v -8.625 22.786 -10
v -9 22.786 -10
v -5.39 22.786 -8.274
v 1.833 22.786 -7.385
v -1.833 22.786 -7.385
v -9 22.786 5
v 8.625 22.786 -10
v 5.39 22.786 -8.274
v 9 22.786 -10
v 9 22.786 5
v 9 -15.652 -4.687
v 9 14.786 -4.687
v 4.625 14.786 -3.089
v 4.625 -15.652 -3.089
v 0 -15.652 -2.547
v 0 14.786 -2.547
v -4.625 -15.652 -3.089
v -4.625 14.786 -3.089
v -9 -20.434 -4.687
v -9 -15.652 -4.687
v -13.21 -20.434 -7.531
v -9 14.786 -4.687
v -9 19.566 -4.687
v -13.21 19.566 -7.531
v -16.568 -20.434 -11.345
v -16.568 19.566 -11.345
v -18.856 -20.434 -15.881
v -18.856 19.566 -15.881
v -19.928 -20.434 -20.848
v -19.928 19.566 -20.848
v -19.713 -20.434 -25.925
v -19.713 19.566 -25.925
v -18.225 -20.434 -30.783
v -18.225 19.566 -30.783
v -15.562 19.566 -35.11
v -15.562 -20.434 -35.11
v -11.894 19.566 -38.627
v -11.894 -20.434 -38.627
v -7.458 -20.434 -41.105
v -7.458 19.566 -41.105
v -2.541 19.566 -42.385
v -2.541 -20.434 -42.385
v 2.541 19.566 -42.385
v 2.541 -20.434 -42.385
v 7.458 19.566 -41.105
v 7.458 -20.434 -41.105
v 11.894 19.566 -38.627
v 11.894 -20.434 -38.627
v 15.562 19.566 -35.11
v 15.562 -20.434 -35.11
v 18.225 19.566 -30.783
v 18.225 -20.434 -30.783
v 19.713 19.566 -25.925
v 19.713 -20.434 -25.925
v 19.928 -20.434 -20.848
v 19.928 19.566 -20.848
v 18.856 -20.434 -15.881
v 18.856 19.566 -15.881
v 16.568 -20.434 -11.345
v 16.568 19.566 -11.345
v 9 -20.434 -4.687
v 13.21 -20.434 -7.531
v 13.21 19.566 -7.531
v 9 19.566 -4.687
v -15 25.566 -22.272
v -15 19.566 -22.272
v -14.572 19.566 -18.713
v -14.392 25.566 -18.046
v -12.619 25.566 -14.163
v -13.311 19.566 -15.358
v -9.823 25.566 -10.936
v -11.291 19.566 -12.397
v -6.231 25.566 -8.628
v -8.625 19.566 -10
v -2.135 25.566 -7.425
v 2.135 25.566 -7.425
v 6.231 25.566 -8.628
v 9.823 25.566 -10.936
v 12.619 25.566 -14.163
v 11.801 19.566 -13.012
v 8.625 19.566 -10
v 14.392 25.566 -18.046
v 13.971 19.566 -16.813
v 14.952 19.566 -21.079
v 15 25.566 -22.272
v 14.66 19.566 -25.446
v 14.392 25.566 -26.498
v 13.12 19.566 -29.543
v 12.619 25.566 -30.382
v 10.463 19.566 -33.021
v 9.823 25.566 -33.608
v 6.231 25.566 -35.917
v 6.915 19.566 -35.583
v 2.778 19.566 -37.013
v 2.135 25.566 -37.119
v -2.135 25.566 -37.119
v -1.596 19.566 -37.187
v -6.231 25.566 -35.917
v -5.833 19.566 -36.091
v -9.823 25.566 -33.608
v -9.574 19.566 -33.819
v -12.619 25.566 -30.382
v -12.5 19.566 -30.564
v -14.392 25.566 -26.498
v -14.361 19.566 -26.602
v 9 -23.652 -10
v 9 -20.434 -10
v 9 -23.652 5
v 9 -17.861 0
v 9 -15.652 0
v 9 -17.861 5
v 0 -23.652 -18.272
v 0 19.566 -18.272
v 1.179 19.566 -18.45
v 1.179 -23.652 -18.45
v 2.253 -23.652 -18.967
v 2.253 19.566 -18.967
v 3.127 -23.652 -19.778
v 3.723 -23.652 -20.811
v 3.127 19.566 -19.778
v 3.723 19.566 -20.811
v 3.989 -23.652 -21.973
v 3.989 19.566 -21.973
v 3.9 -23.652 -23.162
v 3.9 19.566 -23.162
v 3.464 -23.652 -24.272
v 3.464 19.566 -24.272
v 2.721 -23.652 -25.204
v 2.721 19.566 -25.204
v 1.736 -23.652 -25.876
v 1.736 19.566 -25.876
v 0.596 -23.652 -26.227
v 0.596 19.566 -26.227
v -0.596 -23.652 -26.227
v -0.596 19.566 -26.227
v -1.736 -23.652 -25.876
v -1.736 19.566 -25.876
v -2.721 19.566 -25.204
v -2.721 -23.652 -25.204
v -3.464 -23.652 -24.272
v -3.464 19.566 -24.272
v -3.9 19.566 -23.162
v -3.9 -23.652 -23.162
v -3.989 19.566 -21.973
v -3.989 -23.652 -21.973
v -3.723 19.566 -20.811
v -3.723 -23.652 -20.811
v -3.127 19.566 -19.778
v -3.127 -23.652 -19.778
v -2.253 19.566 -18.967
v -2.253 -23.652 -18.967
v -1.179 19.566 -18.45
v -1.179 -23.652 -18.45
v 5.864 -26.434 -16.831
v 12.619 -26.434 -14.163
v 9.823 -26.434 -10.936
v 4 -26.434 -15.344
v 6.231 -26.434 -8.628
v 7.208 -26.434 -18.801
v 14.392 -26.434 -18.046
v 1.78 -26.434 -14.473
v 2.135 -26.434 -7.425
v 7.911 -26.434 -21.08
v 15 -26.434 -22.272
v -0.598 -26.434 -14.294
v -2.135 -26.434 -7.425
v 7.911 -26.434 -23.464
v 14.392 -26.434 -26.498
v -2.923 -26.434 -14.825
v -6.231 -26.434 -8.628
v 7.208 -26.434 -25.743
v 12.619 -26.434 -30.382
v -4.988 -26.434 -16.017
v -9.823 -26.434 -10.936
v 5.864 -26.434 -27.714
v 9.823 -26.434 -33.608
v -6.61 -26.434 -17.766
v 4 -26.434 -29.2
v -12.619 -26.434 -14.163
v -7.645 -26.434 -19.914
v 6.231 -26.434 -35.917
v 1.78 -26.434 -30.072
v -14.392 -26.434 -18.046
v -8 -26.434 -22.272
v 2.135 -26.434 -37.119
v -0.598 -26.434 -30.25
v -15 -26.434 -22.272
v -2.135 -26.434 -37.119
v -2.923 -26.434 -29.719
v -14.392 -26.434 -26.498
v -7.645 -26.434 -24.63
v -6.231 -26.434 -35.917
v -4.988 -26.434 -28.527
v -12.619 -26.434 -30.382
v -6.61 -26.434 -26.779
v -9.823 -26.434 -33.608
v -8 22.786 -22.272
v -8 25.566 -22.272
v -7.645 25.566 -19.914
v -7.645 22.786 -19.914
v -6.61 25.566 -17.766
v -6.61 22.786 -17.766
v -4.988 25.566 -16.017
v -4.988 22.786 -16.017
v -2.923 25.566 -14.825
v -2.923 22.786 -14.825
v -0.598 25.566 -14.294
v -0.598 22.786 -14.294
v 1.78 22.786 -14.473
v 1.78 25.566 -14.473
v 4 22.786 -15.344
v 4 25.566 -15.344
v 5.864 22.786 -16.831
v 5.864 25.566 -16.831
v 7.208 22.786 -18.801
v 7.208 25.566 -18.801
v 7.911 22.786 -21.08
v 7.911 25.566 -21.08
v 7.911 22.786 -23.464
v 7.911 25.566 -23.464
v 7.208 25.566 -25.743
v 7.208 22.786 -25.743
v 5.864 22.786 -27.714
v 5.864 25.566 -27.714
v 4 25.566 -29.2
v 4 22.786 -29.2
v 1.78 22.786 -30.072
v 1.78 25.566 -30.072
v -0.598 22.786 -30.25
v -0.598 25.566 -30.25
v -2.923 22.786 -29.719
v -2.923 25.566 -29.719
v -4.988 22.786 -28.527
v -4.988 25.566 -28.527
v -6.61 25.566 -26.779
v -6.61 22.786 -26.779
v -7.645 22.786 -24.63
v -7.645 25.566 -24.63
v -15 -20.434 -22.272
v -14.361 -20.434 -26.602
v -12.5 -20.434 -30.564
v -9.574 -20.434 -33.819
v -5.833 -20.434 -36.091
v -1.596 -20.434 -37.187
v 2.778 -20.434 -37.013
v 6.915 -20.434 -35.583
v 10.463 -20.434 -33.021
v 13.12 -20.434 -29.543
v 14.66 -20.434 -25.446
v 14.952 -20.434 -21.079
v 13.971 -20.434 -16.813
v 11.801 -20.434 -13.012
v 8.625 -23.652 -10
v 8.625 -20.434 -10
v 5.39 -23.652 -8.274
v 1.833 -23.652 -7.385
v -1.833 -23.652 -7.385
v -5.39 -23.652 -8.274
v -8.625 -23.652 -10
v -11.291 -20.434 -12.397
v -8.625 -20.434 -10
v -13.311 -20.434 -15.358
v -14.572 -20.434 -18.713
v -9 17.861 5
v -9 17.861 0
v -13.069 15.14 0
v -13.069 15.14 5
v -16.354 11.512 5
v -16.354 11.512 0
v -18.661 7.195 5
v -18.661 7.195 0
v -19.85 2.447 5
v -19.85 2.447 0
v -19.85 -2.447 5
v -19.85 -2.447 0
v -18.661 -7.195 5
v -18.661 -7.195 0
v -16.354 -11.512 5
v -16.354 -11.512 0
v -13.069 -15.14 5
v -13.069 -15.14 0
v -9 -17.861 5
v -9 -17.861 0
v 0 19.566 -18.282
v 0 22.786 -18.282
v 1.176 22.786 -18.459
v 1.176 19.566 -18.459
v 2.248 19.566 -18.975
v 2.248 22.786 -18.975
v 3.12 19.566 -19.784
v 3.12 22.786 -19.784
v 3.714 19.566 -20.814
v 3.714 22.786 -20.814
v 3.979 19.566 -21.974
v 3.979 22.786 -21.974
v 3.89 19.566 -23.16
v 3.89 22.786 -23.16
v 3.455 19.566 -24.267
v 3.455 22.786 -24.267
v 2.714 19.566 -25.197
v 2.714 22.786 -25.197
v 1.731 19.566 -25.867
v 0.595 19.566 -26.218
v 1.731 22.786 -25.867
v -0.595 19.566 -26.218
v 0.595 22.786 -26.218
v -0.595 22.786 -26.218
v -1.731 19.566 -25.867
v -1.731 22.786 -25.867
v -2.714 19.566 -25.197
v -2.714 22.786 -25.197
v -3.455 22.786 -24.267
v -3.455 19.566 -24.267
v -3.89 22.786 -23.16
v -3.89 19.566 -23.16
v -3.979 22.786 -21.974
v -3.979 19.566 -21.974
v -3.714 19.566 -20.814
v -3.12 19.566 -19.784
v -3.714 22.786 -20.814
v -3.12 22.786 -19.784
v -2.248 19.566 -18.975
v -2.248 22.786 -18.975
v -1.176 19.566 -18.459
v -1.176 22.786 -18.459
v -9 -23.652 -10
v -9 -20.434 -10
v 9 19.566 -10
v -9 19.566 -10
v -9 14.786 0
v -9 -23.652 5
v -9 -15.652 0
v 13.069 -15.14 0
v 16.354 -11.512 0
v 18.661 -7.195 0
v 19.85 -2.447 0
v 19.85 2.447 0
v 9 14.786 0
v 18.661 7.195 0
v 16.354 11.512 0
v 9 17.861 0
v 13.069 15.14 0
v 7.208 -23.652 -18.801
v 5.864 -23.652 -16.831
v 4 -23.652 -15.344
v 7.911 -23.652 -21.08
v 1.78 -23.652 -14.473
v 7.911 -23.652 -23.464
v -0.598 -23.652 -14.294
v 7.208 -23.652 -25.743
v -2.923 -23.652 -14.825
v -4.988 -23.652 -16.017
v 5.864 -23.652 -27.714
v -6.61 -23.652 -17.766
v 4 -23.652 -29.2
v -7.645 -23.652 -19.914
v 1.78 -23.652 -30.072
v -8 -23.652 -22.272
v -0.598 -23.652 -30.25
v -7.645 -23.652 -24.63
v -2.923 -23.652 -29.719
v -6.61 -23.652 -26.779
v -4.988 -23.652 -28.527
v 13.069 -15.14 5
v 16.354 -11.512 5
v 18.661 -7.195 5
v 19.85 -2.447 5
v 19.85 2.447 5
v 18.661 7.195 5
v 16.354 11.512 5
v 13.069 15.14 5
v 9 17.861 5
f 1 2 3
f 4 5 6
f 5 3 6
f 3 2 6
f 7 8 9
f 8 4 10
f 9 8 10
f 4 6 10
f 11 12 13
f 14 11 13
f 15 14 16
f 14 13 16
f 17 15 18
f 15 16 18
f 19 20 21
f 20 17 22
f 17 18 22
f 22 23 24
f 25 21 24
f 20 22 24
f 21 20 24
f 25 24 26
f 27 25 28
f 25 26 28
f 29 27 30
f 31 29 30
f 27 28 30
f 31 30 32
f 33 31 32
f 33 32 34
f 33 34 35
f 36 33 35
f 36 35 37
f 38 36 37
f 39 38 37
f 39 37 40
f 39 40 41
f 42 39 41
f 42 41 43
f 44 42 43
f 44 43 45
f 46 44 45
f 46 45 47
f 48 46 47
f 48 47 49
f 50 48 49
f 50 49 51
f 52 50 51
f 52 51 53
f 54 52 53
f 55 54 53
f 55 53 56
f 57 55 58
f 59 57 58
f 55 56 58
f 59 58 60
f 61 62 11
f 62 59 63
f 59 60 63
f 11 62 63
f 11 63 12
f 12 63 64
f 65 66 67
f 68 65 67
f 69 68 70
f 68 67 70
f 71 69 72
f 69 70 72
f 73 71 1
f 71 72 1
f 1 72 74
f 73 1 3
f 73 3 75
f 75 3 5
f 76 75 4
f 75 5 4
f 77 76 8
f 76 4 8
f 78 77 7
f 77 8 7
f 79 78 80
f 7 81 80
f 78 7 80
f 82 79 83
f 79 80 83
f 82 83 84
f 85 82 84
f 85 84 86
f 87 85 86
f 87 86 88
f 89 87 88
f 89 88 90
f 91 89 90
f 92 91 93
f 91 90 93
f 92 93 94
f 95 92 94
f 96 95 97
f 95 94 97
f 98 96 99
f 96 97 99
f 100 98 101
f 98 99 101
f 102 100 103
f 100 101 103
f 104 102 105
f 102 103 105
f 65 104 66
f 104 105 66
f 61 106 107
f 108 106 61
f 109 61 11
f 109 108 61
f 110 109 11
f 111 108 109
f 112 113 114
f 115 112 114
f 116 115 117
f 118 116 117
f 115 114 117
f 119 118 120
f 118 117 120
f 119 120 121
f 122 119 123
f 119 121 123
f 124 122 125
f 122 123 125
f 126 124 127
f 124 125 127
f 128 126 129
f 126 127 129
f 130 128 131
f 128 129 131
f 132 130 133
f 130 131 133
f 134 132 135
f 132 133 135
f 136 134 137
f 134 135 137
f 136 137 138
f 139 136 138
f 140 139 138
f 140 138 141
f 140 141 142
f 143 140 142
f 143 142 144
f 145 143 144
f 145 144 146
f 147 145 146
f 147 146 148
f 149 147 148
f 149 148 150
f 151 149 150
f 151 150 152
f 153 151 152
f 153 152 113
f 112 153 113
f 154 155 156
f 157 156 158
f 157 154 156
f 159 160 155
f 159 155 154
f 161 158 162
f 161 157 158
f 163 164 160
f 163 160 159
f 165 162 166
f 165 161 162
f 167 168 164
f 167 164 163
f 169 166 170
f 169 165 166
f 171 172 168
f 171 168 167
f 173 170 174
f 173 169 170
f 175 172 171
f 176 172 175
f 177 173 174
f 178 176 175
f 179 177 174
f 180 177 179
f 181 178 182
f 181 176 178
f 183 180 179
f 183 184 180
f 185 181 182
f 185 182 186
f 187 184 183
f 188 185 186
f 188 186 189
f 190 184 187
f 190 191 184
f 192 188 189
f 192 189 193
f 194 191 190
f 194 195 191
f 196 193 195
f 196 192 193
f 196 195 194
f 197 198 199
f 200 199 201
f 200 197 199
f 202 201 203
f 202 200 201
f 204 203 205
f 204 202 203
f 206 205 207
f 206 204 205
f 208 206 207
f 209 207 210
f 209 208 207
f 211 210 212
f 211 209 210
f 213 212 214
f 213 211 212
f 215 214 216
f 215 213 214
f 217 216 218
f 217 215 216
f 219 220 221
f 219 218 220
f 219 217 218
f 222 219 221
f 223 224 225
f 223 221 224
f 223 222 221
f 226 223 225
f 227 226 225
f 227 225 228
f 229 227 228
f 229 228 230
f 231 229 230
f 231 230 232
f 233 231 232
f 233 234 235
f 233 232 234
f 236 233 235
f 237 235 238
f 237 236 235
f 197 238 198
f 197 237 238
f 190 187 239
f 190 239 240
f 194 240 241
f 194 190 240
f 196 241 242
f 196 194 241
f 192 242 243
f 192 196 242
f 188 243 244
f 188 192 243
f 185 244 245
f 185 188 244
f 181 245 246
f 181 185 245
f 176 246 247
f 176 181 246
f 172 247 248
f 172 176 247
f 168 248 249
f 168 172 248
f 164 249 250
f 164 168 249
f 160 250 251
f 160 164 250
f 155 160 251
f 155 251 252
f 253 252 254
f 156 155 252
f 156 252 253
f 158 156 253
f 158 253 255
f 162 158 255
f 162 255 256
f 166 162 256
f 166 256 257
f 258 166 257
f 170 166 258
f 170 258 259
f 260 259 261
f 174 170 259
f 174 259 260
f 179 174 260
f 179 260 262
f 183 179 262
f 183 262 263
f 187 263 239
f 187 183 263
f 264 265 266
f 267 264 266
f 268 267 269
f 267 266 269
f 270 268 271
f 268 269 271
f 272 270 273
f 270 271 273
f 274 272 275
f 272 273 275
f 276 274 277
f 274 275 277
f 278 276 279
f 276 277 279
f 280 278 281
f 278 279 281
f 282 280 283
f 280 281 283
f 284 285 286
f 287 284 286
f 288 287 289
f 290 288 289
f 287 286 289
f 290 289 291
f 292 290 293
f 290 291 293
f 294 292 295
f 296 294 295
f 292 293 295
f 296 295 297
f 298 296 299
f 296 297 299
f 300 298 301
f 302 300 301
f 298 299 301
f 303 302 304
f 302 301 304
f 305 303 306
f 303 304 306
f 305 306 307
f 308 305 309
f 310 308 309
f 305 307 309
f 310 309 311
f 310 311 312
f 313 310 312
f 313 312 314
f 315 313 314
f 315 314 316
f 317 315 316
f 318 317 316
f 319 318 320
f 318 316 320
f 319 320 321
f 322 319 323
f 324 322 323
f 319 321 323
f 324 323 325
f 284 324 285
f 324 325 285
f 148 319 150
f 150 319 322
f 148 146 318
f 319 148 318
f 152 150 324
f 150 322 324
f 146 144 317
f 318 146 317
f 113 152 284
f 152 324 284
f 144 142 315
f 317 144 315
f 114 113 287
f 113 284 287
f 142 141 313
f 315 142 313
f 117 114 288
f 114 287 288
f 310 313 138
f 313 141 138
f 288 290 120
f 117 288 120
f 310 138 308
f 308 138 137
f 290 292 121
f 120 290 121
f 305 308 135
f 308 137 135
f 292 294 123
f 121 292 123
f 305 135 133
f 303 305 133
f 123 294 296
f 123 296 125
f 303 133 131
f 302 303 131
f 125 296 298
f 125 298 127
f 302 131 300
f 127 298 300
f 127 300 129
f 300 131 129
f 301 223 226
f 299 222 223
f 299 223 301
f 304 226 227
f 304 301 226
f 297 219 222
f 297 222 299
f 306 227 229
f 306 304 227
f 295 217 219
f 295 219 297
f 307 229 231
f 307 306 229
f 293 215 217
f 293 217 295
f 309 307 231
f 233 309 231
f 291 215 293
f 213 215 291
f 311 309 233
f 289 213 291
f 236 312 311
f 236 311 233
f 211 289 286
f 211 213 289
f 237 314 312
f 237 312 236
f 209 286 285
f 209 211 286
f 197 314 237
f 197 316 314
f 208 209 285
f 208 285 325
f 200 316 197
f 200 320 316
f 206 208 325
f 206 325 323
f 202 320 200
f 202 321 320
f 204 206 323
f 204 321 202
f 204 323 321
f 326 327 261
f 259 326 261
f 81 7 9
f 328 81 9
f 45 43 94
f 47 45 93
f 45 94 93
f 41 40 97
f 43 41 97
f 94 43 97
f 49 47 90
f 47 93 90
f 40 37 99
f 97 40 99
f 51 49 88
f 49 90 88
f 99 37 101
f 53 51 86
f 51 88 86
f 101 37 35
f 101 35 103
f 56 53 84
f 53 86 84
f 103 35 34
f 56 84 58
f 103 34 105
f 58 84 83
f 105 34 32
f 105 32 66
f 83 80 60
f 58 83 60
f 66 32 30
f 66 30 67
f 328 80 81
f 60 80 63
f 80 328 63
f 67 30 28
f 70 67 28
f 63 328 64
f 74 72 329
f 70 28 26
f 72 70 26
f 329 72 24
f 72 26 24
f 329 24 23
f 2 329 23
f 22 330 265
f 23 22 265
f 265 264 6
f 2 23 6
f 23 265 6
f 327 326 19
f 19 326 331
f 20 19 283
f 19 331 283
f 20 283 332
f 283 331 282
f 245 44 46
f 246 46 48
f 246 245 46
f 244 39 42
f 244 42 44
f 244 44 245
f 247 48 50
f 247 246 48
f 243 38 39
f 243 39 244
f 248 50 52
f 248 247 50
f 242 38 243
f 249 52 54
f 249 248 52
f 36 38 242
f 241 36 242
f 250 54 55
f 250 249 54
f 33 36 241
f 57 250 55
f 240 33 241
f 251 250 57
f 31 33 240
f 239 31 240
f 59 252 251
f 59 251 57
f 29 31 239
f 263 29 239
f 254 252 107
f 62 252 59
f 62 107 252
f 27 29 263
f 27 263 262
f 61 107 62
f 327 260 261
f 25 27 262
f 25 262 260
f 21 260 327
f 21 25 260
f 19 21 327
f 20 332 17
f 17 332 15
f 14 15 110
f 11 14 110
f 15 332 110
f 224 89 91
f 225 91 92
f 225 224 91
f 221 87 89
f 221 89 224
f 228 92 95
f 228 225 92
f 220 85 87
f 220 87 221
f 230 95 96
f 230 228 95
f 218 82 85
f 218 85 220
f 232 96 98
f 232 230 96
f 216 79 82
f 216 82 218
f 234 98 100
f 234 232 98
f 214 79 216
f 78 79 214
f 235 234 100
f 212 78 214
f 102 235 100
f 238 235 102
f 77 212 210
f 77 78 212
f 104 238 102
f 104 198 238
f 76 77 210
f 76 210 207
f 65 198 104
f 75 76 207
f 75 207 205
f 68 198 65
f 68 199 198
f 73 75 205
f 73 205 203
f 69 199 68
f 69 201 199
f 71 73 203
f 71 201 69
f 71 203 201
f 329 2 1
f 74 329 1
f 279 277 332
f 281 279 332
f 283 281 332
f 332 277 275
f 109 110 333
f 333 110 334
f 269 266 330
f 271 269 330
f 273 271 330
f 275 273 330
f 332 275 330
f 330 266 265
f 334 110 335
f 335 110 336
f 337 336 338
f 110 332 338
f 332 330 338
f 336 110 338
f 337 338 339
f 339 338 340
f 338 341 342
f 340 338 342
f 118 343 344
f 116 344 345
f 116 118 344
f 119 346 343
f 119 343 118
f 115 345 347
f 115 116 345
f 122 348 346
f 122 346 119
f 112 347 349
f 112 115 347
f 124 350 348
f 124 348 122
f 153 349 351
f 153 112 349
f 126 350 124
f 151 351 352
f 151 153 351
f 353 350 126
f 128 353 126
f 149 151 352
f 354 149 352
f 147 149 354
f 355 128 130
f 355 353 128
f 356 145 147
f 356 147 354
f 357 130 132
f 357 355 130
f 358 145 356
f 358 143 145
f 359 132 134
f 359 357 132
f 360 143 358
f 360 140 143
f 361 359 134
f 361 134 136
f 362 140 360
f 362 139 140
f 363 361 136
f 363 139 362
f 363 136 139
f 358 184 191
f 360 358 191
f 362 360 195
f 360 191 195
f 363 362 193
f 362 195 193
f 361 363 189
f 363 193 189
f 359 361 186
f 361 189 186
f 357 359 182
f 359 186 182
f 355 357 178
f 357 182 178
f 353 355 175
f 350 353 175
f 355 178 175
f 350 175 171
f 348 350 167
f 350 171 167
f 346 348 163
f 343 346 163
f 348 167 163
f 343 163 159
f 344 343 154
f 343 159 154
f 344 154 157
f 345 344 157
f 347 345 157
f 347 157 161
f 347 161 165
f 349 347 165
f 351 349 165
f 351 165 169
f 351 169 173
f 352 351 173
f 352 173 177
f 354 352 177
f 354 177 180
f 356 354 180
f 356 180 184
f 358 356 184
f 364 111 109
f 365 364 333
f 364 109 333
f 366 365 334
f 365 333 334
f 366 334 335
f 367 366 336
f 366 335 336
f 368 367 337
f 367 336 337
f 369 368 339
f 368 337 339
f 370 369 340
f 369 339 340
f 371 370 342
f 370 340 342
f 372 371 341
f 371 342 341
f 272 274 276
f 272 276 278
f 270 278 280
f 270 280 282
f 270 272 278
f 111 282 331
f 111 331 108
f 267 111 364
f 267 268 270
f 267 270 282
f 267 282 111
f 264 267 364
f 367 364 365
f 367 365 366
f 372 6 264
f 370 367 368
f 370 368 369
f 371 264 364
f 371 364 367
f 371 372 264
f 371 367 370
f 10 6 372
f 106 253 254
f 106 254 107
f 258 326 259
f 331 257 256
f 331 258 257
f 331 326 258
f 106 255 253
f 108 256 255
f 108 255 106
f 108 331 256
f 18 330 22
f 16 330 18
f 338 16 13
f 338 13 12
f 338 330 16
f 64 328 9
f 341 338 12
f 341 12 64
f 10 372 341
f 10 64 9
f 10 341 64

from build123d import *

# Parameters (mm, degrees)
SKETCH_1_R           = 20
EXTRUDE_1_DEPTH      = 5
SKETCH_3_W           = 18
SKETCH_3_H           = 8
EXTRUDE_2_DEPTH      = 15
EXTRUDE_3_DEPTH      = 35.22
EXTRUDE_3_DEPTH_BACK = 4.78
SKETCH_4_R           = 20
EXTRUDE_4_DEPTH      = 6
EXTRUDE_4_DEPTH_BACK = 36.43845651
SKETCH_6_R           = 15
SKETCH_10_R          = 8
CUT_EXTRUDE_1_DEPTH  = 6
EXTRUDE_START        = 6
SKETCH_14_R          = 15
EXTRUDE_6_DEPTH      = 6
CUT_EXTRUDE_START    = 6
SKETCH_11_R          = 8
CUT_EXTRUDE_4_DEPTH  = 6
SKETCH_16_R          = 4
CUT_EXTRUDE_5_DEPTH  = 50
SKETCH_23_R          = 4.01
SKETCH_23_R_2        = 3.99
EXTRUDE_7_DEPTH      = 3.22


with BuildPart() as part:
    # 草图1 → 凸台-拉伸1 (new body)
    with BuildSketch(Plane.XY):
        Circle(SKETCH_1_R)
    extrude(amount=EXTRUDE_1_DEPTH)

    # 草图3 → 凸台-拉伸2 (add)
    with BuildSketch(Plane.XY.offset(5)):
        with Locations((0, -19.652481849)):
            Rectangle(SKETCH_3_W, SKETCH_3_H)
        with Locations((0, 18.785974665)):
            Rectangle(SKETCH_3_W, SKETCH_3_H)
    extrude(amount=-EXTRUDE_2_DEPTH)

    # 草图4 → 凸台-拉伸3 (add, two sides: drawn at the far end of the back side and taken through both)
    with BuildSketch(Plane.XZ.offset(-14.785974665).offset(-EXTRUDE_3_DEPTH_BACK)):
        with Locations((0, -22.547246605)):
            Circle(SKETCH_4_R)
    extrude(amount=EXTRUDE_3_DEPTH + EXTRUDE_3_DEPTH_BACK)

    # 草图6 → 凸台-拉伸4 (add, two sides: drawn at the far end of the back side and taken through both)
    with BuildSketch(Plane(origin=(0, 19.565974665, 0), x_dir=(1, 0, 0), z_dir=(0, 1, 0)).offset(-EXTRUDE_4_DEPTH_BACK)):
        with Locations((0, 22.272123062)):
            Circle(SKETCH_6_R)
    extrude(amount=EXTRUDE_4_DEPTH + EXTRUDE_4_DEPTH_BACK)

    # 草图10 → 切除-拉伸1 (cut)
    with BuildSketch(Plane(origin=(0, 22.785974665, 0), x_dir=(1, 0, 0), z_dir=(0, 1, 0))):
        with Locations((0, 22.272123062)):
            Circle(SKETCH_10_R)
    extrude(amount=CUT_EXTRUDE_1_DEPTH, mode=Mode.SUBTRACT)

    # 草图14 → 凸台-拉伸6 (add)
    with BuildSketch(Plane(origin=(0, -20.434025335, 0), x_dir=(-1, 0, 0), z_dir=(0, -1, 0)).offset(EXTRUDE_START)):
        with Locations((0, 22.272123062)):
            Circle(SKETCH_14_R)
    extrude(amount=-EXTRUDE_6_DEPTH)

    # 草图11 → 切除-拉伸4 (cut)
    with BuildSketch(Plane.XZ.offset(23.652481849).offset(CUT_EXTRUDE_START)):
        with Locations((0, -22.272123062)):
            Circle(SKETCH_11_R)
    extrude(amount=-CUT_EXTRUDE_4_DEPTH, mode=Mode.SUBTRACT)

    # 草图16 → 切除-拉伸5 (cut)
    with BuildSketch(Plane(origin=(0, 22.785974665, 0), x_dir=(1, 0, 0), z_dir=(0, 1, 0))):
        with Locations((0, 22.272123062)):
            Circle(SKETCH_16_R)
    extrude(amount=-CUT_EXTRUDE_5_DEPTH, mode=Mode.SUBTRACT)

    # 草图23 → 凸台-拉伸7 (add)
    with BuildSketch(Plane(origin=(0, 22.785974665, 0), x_dir=(1, 0, 0), z_dir=(0, 1, 0))):
        with Locations((0, 22.272123062)):
            Circle(SKETCH_23_R)
        with Locations((0, 22.272123062)):
            Circle(SKETCH_23_R_2, mode=Mode.SUBTRACT)
    extrude(amount=-EXTRUDE_7_DEPTH)


solid = part.part
